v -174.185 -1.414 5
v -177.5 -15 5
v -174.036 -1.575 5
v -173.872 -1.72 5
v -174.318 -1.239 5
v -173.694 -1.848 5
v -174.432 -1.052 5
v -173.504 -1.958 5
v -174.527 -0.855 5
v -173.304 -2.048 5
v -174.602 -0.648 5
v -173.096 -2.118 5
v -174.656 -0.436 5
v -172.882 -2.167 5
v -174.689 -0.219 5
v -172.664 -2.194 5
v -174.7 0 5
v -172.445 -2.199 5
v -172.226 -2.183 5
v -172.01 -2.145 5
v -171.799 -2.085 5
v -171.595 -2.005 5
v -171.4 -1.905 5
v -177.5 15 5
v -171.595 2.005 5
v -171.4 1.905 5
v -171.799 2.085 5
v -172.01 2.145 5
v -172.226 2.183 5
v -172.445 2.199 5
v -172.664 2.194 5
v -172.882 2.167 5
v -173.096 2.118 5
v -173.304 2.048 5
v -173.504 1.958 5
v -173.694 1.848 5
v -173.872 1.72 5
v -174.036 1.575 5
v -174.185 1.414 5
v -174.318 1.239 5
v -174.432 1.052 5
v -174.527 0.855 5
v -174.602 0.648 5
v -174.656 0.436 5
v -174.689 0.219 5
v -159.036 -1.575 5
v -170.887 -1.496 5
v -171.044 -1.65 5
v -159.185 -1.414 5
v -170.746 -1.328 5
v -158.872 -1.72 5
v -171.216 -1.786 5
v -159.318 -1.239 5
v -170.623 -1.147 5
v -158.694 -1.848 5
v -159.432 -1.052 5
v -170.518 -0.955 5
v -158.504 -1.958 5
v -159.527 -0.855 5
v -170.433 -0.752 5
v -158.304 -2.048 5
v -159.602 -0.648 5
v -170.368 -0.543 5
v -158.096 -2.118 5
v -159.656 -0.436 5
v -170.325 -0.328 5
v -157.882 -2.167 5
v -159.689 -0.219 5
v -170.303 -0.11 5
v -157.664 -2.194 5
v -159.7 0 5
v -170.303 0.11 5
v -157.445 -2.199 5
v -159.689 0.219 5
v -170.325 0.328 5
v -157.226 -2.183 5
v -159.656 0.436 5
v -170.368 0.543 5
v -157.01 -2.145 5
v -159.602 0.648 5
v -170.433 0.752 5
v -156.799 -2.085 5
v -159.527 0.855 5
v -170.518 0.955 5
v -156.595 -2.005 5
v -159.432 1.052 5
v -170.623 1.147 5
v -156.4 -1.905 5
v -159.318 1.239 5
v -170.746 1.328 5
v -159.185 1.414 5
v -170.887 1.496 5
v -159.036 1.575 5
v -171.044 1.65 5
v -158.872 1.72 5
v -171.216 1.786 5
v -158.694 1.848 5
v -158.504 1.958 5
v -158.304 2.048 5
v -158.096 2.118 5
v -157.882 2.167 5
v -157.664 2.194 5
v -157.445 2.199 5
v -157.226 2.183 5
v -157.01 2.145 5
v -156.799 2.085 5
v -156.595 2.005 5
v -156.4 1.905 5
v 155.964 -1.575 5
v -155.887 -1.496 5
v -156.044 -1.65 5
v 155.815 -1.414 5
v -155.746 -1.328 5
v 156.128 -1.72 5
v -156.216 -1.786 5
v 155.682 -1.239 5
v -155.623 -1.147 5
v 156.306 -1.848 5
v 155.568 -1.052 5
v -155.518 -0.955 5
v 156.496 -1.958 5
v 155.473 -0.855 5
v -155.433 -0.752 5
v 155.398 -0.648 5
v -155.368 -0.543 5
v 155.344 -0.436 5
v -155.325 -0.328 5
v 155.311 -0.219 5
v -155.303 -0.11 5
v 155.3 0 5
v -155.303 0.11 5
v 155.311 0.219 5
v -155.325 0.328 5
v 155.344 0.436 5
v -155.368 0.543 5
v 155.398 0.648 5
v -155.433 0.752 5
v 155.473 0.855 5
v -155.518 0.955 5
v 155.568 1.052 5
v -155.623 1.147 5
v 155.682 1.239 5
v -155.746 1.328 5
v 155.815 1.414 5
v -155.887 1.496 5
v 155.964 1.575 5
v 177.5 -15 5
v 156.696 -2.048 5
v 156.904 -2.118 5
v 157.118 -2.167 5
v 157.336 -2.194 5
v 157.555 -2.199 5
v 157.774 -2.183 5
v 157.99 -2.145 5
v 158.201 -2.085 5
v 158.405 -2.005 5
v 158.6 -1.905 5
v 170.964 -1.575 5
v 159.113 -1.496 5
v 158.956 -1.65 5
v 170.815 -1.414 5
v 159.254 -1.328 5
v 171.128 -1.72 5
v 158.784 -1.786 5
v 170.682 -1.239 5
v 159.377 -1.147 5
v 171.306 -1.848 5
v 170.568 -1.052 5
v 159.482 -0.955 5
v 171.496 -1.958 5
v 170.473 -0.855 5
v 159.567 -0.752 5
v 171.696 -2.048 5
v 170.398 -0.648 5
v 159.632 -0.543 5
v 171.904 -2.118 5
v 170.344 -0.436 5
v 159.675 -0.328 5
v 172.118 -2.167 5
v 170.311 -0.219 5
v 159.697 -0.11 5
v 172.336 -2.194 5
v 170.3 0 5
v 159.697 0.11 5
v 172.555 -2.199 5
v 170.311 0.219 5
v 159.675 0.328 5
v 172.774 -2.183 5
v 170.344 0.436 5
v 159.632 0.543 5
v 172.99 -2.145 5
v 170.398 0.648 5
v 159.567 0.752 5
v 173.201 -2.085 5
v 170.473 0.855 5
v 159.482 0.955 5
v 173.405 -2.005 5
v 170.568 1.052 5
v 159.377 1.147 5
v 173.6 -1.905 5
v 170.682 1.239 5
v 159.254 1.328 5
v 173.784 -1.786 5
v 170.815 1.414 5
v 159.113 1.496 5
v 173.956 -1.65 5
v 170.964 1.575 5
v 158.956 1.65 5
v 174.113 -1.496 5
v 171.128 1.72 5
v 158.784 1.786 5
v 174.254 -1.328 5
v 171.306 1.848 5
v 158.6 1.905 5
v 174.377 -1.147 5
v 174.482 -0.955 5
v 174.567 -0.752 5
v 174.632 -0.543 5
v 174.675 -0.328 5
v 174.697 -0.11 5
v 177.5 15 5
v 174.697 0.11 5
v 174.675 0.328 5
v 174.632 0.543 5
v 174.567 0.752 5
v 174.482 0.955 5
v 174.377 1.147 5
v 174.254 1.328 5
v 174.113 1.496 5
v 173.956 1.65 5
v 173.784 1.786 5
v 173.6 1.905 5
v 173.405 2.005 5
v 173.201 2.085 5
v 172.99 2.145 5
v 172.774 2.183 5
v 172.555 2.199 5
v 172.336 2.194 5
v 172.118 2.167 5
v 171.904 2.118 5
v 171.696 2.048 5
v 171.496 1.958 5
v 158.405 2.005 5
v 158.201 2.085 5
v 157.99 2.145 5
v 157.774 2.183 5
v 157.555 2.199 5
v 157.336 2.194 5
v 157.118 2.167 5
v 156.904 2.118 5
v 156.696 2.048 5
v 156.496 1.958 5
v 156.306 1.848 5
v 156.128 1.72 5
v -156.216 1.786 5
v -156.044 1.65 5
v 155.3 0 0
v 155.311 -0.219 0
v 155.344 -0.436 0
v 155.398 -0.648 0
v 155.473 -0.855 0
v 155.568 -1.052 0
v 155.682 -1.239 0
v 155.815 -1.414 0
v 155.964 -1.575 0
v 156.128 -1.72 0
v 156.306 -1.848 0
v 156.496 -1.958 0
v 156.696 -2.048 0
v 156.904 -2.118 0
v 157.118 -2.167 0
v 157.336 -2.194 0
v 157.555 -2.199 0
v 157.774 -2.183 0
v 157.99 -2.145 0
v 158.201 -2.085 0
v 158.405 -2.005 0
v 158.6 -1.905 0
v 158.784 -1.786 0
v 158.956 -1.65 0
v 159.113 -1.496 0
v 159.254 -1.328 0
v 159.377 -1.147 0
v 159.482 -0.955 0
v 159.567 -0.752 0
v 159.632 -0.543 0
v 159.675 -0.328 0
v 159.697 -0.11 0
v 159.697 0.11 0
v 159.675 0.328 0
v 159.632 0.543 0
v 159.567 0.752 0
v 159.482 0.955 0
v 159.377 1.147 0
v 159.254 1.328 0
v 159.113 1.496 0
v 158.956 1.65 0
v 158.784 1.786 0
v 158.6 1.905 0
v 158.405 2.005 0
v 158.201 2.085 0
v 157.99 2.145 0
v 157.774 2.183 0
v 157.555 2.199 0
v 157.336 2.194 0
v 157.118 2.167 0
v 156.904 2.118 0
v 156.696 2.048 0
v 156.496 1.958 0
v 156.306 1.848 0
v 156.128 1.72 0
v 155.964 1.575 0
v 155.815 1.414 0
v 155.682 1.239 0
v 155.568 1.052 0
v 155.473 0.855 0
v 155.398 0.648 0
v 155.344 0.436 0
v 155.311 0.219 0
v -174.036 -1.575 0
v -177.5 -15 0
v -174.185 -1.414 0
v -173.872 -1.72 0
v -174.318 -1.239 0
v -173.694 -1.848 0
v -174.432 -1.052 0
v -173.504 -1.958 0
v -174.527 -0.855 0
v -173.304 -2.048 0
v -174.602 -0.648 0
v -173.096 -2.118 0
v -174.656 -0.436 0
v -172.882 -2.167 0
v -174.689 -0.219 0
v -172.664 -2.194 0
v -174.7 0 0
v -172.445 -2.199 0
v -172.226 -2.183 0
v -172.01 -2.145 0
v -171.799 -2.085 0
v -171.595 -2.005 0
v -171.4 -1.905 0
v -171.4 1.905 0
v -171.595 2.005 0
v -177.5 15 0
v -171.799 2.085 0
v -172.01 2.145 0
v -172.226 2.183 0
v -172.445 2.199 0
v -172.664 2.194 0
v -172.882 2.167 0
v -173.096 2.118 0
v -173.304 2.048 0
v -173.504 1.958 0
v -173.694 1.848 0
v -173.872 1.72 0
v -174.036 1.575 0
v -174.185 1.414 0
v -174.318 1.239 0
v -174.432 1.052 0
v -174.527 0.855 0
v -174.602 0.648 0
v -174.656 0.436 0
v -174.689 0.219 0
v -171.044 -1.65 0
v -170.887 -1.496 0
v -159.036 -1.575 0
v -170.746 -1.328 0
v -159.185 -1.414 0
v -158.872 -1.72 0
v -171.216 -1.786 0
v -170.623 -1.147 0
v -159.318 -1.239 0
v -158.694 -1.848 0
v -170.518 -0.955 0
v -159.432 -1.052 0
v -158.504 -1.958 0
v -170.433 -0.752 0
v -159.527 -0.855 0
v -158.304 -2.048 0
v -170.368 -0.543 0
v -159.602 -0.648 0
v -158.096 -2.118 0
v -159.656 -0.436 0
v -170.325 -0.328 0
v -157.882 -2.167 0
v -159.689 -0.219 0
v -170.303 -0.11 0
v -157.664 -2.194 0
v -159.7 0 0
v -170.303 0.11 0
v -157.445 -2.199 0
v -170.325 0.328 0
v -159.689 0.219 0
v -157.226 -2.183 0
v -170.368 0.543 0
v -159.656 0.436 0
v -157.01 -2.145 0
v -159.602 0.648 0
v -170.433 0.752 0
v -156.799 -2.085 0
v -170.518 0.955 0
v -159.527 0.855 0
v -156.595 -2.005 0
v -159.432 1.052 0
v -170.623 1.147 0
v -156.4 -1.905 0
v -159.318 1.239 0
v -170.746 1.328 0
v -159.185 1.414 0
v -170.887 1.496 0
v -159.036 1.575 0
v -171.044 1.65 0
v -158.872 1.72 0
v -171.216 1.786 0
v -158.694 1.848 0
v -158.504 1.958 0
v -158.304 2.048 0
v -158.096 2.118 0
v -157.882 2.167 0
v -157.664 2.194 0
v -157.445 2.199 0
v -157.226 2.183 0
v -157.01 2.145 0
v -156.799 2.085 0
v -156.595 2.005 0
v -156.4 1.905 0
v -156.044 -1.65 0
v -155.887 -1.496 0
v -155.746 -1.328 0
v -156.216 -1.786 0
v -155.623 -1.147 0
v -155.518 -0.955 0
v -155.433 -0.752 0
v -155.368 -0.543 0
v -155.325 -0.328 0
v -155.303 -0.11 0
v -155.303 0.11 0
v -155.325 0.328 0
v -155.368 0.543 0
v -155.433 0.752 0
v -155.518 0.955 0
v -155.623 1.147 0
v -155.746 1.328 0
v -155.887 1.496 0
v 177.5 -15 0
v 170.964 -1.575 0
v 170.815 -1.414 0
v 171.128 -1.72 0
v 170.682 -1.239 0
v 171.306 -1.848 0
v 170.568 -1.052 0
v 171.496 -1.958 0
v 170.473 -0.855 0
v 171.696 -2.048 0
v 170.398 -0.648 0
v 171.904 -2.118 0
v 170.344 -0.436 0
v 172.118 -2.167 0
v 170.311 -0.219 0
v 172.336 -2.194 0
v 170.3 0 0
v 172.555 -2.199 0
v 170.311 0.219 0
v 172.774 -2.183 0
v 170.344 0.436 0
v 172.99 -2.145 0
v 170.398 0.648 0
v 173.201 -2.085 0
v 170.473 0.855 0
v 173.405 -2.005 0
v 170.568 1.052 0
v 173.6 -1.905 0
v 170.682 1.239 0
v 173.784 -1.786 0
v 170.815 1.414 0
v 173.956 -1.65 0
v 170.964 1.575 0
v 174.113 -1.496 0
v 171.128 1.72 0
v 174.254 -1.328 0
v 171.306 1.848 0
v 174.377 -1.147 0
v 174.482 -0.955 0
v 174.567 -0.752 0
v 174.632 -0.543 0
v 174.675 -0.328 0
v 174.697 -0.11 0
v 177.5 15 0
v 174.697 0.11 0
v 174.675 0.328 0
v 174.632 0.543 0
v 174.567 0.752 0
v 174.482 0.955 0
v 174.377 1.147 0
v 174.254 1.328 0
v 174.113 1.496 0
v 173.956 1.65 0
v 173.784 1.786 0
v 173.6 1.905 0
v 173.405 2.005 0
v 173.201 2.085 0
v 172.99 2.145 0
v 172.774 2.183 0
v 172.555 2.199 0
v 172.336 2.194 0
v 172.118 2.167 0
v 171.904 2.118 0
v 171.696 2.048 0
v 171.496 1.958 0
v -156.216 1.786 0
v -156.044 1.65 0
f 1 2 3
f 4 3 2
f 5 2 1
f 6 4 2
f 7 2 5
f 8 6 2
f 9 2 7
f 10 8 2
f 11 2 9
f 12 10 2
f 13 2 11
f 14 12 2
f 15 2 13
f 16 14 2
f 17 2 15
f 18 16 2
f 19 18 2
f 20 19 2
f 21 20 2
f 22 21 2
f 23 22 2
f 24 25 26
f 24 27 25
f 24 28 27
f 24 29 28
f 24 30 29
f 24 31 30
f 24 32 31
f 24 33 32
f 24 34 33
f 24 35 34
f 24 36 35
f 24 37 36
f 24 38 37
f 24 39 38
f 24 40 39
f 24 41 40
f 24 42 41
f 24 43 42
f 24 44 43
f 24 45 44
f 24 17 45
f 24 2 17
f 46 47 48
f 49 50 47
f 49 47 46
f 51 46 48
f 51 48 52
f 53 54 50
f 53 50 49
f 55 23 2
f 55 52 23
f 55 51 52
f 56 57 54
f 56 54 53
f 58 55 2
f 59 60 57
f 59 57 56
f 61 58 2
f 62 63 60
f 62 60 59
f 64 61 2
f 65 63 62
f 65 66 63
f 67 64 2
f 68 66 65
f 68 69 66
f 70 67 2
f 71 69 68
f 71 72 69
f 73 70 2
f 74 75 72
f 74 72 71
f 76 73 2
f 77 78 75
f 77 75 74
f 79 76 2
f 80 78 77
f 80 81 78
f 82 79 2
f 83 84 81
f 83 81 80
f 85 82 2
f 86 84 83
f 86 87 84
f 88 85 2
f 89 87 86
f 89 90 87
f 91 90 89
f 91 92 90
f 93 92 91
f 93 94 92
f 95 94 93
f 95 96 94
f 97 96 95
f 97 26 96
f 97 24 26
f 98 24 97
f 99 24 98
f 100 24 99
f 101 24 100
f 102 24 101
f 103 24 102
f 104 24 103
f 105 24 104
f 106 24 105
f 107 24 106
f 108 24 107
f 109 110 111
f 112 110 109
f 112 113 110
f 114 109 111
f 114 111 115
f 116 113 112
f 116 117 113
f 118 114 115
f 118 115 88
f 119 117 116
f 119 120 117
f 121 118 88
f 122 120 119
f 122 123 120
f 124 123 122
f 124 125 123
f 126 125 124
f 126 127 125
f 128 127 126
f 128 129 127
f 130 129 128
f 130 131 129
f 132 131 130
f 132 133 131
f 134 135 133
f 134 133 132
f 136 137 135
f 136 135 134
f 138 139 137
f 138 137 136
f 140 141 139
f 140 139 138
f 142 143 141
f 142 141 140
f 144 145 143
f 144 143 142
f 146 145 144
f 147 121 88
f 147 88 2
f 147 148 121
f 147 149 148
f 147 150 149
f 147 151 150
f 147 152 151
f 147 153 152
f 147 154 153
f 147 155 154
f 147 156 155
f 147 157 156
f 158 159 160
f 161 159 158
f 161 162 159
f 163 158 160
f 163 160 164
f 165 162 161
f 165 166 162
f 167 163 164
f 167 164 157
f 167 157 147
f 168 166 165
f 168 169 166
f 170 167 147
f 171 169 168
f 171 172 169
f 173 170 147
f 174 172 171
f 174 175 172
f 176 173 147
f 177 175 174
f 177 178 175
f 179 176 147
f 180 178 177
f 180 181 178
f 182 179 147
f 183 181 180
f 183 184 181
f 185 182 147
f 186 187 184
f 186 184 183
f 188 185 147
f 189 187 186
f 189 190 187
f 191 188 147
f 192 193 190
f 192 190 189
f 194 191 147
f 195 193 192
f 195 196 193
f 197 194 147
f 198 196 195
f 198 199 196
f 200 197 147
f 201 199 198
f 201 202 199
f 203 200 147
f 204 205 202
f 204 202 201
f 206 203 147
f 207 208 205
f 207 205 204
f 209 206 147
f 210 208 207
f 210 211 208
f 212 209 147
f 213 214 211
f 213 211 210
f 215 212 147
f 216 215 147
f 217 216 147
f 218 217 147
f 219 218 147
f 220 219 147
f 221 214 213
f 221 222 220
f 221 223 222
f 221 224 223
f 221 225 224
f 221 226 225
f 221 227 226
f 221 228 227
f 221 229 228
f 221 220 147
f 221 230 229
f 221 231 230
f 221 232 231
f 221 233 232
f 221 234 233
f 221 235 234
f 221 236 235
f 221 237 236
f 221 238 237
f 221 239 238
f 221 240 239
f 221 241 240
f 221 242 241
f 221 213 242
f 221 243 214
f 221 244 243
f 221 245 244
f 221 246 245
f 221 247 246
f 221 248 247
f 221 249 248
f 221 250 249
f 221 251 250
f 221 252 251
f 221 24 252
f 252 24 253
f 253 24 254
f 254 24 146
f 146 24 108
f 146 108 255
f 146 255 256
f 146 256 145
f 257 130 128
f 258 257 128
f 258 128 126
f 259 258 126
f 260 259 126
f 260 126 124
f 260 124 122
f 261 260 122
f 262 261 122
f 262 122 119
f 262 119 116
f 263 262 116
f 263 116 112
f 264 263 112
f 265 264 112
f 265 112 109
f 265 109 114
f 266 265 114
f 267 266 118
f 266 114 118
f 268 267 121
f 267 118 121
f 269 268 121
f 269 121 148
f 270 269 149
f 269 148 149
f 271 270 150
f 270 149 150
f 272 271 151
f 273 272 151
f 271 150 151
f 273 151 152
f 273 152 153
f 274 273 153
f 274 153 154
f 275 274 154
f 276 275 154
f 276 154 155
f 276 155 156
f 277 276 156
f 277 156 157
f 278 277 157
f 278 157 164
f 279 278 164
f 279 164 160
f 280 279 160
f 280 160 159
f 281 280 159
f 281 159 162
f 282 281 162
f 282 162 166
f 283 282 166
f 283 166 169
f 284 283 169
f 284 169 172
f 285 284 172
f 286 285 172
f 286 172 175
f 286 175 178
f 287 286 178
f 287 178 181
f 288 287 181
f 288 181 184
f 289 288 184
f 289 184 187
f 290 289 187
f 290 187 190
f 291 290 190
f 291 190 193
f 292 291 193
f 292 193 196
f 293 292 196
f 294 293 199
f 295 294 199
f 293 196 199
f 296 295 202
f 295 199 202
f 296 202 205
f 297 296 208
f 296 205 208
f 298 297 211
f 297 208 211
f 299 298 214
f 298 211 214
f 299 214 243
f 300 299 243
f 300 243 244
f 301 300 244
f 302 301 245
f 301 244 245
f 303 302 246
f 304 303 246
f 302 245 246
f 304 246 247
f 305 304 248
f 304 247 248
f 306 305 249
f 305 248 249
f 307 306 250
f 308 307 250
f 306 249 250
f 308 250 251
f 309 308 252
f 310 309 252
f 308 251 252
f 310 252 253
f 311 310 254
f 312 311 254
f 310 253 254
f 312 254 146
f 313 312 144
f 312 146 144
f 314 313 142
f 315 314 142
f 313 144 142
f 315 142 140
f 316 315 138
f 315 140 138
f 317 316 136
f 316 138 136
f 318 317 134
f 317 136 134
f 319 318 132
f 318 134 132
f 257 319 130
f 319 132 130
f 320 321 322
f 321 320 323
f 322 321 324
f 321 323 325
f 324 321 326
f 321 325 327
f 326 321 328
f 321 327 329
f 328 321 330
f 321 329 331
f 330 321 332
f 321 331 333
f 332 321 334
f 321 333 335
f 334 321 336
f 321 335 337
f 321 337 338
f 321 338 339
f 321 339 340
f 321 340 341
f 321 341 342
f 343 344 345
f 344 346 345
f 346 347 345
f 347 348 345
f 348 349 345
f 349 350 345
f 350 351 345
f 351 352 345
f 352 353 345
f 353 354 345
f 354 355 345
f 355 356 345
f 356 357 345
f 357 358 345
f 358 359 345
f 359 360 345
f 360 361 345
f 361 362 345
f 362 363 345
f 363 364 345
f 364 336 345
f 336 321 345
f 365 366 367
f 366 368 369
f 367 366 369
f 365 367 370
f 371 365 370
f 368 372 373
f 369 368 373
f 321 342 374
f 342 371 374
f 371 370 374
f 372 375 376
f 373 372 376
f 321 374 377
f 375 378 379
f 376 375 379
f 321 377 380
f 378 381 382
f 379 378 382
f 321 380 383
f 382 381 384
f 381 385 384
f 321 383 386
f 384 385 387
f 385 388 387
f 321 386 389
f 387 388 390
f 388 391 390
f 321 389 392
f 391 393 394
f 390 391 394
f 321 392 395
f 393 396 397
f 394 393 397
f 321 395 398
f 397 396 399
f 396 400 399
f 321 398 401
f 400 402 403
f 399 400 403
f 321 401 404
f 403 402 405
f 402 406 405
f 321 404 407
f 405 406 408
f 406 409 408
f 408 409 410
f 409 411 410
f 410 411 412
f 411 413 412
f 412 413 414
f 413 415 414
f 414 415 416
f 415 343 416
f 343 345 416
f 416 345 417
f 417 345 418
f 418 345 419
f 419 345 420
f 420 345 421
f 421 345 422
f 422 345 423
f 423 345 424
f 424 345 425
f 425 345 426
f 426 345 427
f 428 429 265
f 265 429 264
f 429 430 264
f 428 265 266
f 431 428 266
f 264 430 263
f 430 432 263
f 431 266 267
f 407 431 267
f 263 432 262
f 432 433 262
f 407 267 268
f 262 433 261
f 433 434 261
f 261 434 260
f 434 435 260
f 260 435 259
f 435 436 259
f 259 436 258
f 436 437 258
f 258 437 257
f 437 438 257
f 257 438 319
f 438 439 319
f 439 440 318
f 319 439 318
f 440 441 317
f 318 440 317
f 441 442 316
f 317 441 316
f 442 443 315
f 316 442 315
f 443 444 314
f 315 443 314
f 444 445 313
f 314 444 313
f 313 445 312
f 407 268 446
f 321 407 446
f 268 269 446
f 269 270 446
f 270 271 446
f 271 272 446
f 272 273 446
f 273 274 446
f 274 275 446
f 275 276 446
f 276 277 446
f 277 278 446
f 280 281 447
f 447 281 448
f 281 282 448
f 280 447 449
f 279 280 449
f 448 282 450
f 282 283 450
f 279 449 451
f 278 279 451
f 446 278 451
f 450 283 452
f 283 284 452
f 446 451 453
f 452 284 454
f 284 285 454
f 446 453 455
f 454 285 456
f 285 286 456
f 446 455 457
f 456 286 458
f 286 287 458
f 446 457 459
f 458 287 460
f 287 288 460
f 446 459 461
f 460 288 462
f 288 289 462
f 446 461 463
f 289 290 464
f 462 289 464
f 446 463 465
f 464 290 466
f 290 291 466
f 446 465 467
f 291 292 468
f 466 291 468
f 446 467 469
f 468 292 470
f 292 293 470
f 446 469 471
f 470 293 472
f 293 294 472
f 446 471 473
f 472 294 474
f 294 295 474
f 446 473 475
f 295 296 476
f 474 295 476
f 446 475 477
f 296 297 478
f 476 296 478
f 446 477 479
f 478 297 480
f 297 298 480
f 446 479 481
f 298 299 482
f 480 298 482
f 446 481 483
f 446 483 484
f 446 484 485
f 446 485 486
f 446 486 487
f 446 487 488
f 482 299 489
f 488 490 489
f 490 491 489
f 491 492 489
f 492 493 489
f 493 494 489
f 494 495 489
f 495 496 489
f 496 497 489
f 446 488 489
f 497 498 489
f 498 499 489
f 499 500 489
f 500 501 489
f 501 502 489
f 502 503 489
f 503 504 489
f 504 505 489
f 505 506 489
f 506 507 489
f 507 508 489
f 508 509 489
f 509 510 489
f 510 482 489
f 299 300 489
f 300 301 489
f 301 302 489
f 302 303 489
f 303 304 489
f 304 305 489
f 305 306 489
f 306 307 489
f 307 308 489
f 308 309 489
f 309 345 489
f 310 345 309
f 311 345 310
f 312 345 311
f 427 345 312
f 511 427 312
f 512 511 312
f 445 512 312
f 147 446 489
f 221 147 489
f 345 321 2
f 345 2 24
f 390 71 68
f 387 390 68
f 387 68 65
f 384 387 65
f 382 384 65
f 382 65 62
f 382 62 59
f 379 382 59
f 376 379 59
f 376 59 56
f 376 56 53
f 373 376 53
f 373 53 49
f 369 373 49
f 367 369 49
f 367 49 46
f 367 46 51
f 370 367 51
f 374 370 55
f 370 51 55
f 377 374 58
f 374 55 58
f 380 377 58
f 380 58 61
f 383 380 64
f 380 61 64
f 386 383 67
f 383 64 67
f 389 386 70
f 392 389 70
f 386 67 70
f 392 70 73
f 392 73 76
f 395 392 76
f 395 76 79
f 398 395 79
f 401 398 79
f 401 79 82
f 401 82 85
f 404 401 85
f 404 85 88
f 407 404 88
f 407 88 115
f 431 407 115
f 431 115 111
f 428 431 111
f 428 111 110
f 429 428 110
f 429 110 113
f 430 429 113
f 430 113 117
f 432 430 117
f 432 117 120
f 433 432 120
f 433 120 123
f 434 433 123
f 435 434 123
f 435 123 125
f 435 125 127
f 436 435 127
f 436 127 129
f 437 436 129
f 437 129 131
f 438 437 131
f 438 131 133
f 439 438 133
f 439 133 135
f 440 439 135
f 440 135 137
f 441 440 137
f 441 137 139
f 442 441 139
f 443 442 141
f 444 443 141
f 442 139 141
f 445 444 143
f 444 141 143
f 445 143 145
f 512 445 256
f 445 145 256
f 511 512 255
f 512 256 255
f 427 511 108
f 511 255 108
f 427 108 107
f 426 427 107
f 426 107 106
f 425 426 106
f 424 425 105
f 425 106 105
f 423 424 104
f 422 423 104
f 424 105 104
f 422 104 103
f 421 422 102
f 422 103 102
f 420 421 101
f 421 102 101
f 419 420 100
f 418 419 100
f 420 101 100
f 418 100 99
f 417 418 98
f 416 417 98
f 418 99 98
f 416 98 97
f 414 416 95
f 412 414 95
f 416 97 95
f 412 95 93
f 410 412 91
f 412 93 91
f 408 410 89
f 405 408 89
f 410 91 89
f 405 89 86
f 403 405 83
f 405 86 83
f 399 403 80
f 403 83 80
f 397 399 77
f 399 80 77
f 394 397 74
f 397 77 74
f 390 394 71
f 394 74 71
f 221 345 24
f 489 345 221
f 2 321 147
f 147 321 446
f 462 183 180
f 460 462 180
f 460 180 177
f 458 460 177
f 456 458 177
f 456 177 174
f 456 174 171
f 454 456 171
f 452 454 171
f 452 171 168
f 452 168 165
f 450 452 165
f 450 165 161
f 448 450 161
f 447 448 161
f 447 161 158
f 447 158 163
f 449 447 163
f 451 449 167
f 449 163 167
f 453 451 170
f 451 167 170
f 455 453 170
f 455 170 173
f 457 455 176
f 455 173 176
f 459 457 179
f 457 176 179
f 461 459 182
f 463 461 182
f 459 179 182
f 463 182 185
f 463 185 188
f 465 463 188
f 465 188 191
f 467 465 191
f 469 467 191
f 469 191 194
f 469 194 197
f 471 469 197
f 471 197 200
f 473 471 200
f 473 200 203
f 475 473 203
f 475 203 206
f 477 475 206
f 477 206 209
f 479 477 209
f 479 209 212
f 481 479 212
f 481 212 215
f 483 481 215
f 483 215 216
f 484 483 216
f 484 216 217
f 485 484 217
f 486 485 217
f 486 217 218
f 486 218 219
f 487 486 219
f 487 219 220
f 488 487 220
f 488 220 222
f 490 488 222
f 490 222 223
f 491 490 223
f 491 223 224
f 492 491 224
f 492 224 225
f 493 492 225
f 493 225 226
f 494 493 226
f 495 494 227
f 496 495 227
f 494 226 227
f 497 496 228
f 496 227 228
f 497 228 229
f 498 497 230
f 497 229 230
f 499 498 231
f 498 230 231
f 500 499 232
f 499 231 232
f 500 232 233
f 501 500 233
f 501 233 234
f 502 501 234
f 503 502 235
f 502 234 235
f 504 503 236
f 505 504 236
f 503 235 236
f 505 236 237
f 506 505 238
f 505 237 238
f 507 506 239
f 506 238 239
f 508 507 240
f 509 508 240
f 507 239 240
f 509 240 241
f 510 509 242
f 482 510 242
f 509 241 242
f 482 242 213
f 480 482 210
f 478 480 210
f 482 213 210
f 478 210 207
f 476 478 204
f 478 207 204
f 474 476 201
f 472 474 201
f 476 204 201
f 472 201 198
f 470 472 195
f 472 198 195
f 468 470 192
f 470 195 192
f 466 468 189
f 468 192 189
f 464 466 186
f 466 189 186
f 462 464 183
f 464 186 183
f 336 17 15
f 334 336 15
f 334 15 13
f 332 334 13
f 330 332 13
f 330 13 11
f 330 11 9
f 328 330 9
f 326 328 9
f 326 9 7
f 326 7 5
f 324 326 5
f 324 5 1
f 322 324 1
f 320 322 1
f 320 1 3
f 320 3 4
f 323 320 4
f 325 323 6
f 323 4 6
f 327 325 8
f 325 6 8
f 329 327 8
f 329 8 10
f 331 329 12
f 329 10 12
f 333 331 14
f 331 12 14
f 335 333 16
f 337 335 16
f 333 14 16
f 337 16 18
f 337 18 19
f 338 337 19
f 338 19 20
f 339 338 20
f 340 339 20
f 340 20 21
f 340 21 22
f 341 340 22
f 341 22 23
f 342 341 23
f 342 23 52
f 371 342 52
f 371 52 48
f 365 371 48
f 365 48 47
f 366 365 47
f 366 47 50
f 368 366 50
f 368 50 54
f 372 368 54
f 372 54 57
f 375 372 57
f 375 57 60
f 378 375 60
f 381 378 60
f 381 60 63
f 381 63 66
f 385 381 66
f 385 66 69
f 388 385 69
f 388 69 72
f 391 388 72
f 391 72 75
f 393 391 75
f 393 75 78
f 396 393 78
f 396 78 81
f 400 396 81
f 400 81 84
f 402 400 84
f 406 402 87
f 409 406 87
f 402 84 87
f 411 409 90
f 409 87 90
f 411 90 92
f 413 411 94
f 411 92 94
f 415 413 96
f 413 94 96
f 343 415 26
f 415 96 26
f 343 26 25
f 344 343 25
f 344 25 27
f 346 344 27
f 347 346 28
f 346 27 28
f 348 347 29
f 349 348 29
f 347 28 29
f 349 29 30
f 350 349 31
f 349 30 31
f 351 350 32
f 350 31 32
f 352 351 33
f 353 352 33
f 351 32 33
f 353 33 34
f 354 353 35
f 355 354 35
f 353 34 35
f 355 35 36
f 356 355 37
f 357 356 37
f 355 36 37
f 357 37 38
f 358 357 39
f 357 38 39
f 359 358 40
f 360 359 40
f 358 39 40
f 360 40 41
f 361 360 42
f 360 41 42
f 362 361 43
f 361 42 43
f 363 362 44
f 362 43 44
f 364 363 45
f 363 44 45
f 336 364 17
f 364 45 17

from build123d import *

# Parameters (mm, degrees)
F0_W     = 355
F0_H     = 30
F1_DEPTH = 5
F2_D     = 4.4


with BuildPart() as f1:
    # F0 (on Top) → F1 (new body)
    with BuildSketch(Plane.XY):
        Rectangle(F0_W, F0_H)
    extrude(amount=F1_DEPTH)

    # F2 (through all)
    with Locations(Plane(origin=(0, 0, 0), x_dir=(1, 0, 0), z_dir=(0, 0, -1))):
        with Locations((157.5, 0), (172.5, 0), (-157.5, 0), (-172.5, 0)):
            Hole(F2_D / 2)


solid = f1.part
